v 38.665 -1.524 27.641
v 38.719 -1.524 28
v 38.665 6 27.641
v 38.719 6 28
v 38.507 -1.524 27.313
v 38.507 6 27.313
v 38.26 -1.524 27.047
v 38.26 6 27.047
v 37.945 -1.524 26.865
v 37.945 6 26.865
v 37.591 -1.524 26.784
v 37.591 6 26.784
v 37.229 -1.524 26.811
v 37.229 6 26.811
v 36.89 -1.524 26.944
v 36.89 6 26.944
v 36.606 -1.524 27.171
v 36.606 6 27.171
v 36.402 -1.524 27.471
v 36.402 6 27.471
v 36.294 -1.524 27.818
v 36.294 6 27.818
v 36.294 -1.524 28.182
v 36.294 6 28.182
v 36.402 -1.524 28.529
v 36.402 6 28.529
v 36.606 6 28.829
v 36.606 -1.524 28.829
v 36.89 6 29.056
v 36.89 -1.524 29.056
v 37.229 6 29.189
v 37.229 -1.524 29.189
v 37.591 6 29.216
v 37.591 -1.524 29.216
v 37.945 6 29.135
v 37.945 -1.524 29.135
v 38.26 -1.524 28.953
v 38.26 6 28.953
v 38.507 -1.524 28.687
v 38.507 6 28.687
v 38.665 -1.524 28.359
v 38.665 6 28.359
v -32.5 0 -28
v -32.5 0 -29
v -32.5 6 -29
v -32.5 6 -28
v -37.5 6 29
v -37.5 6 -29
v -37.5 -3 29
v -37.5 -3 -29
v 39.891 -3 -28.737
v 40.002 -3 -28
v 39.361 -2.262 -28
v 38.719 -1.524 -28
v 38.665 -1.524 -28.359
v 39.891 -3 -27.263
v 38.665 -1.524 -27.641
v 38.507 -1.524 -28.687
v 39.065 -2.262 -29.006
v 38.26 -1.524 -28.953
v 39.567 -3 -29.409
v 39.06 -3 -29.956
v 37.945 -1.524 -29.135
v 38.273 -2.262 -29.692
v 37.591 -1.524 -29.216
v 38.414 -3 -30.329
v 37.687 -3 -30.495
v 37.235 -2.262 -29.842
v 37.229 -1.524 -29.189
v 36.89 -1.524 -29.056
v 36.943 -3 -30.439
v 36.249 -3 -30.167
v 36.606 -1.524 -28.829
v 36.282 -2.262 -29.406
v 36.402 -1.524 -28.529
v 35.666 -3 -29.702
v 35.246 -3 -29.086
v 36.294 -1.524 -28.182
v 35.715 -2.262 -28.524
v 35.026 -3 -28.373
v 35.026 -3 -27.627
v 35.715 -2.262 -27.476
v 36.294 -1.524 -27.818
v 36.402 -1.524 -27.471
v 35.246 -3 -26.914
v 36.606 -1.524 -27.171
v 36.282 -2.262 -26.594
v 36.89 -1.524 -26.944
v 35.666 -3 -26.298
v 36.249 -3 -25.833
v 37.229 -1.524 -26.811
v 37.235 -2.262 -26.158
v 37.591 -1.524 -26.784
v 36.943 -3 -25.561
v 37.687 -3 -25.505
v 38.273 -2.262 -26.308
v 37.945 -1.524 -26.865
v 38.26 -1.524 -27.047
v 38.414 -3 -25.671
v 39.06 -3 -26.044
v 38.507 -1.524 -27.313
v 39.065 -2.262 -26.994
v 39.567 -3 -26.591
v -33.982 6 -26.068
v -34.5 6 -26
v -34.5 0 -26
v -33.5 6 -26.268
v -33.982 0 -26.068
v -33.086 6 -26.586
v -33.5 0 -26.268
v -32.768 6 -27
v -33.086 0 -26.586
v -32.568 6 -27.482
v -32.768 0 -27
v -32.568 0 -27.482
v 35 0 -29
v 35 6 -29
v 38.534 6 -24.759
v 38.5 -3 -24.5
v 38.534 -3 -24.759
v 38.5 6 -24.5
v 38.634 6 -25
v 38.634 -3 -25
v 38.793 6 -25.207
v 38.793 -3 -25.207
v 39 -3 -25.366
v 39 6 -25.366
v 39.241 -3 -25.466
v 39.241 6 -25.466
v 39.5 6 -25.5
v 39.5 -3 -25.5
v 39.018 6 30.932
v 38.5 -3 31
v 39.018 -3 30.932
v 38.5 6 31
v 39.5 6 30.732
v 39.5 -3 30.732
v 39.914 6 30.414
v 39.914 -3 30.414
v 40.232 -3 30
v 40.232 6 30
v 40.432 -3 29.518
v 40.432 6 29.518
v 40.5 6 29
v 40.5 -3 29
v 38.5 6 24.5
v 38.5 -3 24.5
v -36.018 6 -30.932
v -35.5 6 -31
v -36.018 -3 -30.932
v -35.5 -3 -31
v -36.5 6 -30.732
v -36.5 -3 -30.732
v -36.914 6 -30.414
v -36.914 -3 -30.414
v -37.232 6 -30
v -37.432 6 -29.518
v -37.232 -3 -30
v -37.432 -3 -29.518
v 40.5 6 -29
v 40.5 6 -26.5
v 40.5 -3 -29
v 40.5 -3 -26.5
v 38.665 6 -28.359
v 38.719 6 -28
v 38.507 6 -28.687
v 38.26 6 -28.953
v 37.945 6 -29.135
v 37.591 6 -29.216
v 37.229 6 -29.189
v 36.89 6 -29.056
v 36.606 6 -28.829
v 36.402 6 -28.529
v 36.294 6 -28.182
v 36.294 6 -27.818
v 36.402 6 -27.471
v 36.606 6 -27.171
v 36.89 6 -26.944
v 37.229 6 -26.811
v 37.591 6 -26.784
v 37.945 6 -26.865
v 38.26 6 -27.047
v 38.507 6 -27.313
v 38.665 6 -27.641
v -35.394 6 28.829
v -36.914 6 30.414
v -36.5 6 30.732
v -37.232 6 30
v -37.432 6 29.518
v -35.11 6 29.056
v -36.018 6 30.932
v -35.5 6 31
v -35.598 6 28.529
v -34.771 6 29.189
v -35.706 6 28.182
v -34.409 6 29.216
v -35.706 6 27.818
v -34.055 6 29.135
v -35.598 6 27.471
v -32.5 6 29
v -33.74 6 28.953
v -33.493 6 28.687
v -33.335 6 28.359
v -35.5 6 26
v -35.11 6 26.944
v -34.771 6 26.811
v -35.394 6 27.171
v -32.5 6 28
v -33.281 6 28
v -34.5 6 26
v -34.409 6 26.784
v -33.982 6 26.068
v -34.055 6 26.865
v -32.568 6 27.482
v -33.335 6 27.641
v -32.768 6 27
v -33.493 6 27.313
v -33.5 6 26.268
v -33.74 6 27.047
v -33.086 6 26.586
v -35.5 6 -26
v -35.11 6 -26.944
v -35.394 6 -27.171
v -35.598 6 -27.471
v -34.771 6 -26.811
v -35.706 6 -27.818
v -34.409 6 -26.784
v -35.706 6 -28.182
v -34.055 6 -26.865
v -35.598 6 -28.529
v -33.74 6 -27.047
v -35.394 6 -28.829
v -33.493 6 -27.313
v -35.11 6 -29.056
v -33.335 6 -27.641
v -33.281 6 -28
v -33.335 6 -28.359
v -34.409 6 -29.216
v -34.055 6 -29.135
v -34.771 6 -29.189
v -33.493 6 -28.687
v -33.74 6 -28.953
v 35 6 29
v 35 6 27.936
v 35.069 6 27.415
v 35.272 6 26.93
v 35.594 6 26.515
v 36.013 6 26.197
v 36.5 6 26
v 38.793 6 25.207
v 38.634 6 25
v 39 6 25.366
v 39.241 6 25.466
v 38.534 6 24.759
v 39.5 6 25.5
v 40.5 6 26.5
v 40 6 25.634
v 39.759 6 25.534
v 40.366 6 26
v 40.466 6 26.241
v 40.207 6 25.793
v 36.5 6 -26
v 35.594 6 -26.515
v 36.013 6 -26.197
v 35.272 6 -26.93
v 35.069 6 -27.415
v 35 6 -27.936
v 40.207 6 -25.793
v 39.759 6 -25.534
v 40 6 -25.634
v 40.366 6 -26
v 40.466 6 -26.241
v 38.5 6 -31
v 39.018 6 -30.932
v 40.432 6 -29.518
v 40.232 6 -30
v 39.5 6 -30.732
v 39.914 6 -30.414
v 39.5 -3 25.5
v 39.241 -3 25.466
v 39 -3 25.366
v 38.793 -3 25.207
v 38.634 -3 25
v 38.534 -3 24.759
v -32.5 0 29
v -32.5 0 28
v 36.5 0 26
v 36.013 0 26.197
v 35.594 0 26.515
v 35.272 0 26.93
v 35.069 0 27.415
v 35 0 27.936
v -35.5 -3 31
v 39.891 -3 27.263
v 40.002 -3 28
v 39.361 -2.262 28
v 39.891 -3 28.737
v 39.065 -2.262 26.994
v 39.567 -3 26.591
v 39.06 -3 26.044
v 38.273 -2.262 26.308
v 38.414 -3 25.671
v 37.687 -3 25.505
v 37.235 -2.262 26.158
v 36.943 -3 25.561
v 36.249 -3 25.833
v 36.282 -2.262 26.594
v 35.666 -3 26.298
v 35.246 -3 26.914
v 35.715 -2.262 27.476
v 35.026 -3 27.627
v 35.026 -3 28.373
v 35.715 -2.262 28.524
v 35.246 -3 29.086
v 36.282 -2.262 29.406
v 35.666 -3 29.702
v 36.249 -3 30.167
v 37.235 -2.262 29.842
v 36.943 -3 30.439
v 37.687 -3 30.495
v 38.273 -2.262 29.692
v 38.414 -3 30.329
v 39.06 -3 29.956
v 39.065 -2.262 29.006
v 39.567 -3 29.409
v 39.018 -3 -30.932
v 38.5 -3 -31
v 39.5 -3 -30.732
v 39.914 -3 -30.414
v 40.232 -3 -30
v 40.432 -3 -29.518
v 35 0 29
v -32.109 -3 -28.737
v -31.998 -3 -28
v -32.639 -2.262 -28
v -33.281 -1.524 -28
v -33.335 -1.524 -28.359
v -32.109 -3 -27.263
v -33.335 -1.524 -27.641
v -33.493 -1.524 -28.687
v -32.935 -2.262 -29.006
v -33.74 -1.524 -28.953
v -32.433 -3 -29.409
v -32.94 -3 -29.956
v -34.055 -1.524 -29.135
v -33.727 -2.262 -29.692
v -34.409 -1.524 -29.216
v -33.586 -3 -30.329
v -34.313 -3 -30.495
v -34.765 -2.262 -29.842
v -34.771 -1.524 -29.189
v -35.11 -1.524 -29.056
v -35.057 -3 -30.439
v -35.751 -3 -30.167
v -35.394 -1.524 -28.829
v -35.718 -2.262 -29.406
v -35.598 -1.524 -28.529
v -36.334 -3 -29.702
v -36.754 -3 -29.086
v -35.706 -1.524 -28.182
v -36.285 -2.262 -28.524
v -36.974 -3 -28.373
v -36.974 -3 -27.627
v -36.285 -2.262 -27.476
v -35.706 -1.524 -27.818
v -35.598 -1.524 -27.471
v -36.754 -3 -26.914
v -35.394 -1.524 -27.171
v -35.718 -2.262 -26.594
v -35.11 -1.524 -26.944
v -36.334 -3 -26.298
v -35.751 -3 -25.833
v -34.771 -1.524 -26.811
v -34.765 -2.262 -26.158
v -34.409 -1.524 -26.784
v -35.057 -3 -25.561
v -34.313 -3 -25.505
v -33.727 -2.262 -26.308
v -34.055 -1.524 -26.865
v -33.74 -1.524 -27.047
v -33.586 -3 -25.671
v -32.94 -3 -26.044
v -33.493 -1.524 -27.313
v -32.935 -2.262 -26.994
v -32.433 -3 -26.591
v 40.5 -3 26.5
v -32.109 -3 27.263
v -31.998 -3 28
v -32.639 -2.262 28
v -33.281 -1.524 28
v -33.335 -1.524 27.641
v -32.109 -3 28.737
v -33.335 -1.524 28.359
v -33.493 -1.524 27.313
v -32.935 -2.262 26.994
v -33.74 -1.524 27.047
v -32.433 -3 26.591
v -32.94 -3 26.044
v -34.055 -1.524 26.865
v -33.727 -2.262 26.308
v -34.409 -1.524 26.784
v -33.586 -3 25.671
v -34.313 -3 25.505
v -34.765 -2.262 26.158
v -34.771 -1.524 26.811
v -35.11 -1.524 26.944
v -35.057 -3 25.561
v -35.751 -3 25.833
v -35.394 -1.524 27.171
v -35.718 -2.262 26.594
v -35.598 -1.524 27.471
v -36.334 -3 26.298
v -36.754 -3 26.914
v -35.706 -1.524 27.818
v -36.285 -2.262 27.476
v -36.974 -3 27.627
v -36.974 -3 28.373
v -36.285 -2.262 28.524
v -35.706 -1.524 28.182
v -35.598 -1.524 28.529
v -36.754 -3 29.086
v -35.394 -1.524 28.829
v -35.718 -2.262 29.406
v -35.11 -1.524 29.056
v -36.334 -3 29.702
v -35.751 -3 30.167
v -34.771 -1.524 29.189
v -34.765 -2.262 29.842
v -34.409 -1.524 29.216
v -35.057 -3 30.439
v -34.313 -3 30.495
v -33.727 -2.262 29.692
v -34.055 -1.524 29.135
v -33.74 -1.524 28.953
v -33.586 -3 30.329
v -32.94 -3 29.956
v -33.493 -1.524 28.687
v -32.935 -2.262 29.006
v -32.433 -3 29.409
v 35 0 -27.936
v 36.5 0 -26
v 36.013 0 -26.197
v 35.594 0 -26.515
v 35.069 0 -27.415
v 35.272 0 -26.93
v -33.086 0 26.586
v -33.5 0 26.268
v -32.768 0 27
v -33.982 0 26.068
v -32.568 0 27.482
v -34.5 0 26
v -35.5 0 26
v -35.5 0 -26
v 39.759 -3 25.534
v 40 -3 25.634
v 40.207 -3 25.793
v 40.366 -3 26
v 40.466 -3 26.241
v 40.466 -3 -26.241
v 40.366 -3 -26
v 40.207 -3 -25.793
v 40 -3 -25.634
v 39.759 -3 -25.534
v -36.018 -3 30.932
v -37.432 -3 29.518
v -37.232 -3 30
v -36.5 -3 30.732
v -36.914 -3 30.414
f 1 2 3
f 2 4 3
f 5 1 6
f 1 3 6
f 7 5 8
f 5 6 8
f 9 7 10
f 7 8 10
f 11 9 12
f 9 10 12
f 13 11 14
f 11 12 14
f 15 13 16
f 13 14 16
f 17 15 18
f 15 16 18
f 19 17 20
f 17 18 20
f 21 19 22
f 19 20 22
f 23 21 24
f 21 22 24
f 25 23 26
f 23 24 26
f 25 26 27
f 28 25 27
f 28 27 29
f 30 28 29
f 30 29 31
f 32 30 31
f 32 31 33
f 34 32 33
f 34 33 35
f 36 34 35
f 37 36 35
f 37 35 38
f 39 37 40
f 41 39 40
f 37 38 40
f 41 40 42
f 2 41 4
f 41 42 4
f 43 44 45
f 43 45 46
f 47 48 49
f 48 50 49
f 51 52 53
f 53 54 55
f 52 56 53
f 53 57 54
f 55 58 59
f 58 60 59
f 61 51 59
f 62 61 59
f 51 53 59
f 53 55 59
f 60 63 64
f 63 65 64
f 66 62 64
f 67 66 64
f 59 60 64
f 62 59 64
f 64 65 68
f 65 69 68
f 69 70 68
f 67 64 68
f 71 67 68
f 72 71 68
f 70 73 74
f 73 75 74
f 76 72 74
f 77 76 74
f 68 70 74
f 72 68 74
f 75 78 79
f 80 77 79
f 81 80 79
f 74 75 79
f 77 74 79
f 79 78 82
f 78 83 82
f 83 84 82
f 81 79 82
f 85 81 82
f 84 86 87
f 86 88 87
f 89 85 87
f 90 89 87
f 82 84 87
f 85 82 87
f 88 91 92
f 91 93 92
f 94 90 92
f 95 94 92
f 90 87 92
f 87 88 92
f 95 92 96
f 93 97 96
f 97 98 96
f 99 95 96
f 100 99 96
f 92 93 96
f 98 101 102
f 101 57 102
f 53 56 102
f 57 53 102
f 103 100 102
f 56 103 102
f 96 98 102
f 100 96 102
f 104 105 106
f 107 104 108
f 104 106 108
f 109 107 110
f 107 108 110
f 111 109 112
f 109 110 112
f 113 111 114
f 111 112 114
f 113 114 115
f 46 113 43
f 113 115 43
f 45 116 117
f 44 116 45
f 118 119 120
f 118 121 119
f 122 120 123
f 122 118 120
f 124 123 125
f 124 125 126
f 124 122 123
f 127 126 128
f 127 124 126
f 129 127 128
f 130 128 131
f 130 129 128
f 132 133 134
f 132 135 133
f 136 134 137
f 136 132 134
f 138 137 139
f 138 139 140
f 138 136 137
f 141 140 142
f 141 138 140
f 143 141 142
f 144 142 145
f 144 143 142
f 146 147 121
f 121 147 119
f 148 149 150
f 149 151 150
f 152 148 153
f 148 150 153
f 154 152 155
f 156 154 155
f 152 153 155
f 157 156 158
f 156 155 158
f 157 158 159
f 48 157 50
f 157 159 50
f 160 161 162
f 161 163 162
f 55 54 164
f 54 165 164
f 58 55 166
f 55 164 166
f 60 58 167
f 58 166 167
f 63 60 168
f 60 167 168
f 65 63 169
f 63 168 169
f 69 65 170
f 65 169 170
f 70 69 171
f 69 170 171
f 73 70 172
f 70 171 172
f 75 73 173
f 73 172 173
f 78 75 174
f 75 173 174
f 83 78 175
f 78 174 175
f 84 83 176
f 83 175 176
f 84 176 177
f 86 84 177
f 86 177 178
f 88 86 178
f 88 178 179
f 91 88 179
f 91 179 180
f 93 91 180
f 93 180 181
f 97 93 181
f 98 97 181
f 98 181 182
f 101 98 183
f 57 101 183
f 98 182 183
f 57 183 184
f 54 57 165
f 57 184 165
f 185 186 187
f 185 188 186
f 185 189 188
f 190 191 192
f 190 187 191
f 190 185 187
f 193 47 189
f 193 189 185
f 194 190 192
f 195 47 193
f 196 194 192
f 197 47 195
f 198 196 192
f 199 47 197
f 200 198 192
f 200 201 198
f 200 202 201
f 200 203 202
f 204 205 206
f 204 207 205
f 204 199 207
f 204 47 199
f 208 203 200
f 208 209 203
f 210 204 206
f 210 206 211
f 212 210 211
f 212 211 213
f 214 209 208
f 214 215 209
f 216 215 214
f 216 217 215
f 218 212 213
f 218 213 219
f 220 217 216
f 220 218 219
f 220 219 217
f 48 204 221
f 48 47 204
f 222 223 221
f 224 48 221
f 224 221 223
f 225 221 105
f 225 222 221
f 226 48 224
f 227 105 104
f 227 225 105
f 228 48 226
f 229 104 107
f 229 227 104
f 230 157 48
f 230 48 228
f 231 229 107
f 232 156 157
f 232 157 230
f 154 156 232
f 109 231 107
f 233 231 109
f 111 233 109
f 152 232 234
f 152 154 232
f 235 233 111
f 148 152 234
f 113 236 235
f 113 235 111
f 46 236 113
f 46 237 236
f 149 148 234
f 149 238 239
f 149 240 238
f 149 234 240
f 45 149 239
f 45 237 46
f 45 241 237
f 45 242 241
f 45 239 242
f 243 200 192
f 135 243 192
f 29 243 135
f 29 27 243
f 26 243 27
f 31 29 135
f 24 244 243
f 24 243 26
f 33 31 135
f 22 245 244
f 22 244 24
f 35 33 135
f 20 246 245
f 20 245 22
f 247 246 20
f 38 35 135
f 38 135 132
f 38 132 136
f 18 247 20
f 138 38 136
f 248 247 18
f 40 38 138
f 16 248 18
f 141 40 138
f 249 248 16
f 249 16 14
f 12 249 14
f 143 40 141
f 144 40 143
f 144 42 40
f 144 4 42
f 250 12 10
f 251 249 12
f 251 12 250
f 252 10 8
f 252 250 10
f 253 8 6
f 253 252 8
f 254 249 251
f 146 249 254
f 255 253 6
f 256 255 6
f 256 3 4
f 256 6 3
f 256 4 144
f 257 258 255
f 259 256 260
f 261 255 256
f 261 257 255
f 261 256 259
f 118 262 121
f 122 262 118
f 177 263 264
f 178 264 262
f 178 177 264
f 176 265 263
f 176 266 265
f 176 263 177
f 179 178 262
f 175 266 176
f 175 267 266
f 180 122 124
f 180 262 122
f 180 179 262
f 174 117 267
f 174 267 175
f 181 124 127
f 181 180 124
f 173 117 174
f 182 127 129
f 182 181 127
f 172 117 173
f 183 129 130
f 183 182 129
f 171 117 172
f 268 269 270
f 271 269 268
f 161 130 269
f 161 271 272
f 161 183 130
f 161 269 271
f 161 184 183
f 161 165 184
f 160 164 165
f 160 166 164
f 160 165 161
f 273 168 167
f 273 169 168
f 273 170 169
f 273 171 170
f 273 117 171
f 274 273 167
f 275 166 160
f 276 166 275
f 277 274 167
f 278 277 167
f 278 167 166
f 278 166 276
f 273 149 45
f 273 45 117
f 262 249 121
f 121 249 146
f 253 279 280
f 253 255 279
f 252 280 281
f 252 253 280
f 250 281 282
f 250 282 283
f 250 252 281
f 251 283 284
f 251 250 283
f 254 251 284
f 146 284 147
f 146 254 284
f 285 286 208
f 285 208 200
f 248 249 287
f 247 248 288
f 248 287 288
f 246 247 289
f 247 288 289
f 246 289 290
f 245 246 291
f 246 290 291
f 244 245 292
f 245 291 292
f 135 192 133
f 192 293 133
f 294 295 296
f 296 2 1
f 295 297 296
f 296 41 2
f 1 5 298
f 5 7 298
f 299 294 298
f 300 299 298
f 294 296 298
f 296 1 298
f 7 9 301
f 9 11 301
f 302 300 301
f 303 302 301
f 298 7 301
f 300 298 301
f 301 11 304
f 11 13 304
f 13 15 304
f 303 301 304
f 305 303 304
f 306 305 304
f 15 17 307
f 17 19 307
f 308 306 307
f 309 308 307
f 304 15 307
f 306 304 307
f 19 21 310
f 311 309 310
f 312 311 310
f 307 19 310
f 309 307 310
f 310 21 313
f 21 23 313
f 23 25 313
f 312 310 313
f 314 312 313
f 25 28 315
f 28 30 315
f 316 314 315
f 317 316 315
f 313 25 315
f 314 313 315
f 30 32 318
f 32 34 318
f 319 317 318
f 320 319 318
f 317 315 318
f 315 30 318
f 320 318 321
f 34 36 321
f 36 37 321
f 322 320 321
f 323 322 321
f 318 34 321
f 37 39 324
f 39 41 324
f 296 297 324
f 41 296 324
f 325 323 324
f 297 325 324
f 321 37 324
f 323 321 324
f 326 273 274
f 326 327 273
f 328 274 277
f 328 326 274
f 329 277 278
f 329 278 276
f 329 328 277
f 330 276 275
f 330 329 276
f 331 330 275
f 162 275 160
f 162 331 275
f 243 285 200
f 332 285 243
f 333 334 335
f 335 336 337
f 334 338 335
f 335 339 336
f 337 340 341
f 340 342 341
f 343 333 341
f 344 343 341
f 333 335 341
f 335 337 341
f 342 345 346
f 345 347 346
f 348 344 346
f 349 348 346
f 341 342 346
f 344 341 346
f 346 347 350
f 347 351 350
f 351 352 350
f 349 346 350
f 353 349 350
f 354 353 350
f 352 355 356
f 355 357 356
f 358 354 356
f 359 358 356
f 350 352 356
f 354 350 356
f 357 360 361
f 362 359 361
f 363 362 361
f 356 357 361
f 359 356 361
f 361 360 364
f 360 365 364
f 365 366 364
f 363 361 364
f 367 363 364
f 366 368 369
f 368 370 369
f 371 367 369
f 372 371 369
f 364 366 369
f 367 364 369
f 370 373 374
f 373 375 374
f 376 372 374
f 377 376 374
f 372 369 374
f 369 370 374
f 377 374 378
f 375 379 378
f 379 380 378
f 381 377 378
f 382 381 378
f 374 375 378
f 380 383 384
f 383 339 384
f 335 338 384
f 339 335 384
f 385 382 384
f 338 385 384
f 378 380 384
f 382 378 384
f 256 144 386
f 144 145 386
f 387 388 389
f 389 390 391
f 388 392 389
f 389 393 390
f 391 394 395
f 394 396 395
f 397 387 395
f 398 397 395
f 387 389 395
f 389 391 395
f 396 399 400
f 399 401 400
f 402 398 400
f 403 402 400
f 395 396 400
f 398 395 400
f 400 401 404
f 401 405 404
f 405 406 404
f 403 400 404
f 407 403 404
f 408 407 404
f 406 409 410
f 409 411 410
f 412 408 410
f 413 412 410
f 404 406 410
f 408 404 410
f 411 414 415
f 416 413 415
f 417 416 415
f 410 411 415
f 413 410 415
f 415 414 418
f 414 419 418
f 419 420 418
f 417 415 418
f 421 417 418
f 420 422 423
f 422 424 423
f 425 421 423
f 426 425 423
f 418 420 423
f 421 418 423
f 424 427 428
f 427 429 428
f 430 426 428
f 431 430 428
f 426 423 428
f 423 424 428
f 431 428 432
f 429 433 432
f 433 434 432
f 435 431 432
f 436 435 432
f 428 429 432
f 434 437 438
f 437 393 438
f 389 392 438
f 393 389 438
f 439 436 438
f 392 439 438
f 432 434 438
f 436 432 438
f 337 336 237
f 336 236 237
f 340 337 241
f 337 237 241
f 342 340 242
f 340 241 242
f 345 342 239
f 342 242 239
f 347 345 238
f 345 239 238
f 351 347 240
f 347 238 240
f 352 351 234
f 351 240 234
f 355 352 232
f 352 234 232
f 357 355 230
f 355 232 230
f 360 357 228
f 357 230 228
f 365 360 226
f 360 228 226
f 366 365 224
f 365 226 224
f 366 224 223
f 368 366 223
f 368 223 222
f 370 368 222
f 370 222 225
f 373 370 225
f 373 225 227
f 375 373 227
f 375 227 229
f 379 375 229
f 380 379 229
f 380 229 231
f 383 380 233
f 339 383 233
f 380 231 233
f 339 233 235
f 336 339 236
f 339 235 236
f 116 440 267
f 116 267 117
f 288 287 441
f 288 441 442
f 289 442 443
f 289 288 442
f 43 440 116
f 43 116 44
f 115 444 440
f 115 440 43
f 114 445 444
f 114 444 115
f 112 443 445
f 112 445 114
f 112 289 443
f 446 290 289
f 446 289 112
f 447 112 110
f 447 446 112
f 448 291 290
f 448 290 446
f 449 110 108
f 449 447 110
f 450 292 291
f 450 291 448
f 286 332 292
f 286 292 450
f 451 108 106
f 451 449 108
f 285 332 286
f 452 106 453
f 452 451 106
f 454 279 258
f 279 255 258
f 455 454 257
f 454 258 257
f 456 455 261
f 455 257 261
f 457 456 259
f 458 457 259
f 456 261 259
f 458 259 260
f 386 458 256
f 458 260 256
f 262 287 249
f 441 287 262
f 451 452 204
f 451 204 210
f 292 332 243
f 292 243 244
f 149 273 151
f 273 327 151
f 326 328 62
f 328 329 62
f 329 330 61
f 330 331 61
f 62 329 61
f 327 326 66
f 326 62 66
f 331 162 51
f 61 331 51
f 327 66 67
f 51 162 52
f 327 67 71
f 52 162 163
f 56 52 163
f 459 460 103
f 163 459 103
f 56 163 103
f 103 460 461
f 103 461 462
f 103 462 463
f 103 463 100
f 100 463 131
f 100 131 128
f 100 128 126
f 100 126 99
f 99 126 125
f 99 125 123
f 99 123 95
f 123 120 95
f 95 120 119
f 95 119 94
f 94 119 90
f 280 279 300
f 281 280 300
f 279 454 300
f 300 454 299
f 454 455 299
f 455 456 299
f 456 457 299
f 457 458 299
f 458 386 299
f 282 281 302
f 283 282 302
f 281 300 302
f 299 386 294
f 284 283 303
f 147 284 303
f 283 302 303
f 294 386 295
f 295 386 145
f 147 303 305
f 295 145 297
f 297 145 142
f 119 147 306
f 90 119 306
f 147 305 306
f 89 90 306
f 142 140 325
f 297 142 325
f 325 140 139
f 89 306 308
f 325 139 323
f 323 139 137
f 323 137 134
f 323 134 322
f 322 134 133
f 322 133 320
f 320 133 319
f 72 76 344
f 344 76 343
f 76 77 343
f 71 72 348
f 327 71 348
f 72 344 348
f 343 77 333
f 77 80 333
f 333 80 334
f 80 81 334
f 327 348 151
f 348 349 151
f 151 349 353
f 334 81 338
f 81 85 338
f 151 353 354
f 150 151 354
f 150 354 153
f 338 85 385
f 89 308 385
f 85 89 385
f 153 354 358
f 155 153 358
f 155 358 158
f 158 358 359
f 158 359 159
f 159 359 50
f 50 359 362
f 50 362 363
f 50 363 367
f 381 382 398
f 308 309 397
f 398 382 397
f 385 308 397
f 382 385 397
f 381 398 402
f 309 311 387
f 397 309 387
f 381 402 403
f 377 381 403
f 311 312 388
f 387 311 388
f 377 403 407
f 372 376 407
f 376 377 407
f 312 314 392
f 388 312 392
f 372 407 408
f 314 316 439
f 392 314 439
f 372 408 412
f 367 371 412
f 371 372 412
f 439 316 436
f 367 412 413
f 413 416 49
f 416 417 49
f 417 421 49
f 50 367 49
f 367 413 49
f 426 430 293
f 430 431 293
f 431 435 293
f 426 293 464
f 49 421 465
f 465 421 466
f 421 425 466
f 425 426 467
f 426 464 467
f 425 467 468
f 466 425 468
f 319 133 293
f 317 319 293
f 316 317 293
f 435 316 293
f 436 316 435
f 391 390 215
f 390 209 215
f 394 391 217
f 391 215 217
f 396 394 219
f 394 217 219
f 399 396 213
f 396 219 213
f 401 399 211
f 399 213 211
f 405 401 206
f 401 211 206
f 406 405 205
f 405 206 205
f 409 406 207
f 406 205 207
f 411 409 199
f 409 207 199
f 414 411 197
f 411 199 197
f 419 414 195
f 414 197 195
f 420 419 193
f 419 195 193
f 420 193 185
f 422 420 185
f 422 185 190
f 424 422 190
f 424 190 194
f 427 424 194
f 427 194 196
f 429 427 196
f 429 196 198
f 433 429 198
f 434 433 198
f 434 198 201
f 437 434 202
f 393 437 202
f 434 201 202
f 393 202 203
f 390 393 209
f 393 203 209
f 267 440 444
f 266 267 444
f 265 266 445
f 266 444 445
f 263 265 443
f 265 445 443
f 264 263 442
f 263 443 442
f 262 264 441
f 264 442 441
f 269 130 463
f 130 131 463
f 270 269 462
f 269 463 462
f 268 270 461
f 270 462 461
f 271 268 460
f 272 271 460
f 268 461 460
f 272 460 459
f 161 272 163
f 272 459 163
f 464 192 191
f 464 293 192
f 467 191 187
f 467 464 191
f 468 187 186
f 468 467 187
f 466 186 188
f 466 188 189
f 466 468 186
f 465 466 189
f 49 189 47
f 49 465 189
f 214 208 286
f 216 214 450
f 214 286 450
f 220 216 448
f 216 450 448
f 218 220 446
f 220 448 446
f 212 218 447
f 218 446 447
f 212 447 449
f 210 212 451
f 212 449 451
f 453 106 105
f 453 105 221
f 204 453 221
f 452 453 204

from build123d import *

# Parameters (mm, degrees)
BOSS_EXTRUDE2_DEPTH                               = 3
BOSS_EXTRUDE3_DEPTH                               = 6
FILLET5_R                                         = 2
CSK_FOR_2_FLAT_HEAD_SOCKET_CAP_SCREW1_D           = 2.4384
CSK_FOR_2_FLAT_HEAD_SOCKET_CAP_SCREW1_CSINK_D     = 5.0038
CSK_FOR_2_FLAT_HEAD_SOCKET_CAP_SCREW1_CSINK_ANGLE = 82
FILLET6_R                                         = 2
FILLET7_R                                         = 1


# Some blends are built 0.0001 mm under size
with BuildPart() as part:
    # Sketch3 → Boss-Extrude2 (new body)
    with BuildSketch(Plane.XZ):
        Polygon((-37.5, 31), (40.5, 31), (40.5, 25.5), (38.5, 25.5), (38.5, -25.5), (40.5, -25.5), (40.5, -31), (-37.5, -31), align=None)
    extrude(amount=BOSS_EXTRUDE2_DEPTH)

    # Sketch4 → Boss-Extrude3 (add)
    with BuildSketch(Plane(origin=(0, 0, 0), x_dir=(1, 0, 0), z_dir=(0, 1, 0))):
        Polygon((-37.5, -31), (40.5, -31), (40.5, -25.5), (38.5, -25.5), (38.5, 25.5), (40.5, 25.5), (40.5, 31), (-37.5, 31), align=None)
        Polygon((-32.5, -29), (35, -29), (35, -26), (36.5, -26), (36.5, 26), (35, 26), (35, 29), (-32.5, 29), (-32.5, 26), (-35.5, 26), (-35.5, -26), (-32.5, -26), align=None, mode=Mode.SUBTRACT)
    extrude(amount=BOSS_EXTRUDE3_DEPTH)

    # Fillet5
    # the kernel refuses this fillet: 2 mm, written as the material it takes off along each edge
    with BuildSketch(Plane(origin=(35, 0, 26), x_dir=(0, 0, 1), z_dir=(0, 1, 0))) as fillet5_piece_1:
        with BuildLine():
            CenterArc((1.936491673, 2), FILLET5_R, 194.477512186, 75.522487814)
            Line((0, 1.5), (-0.038729833, 1.49))
            ThreePointArc((-0.038729833, 1.49), (-0.04, 0.75), (-0.04, 0))
            Line((-0.04, 0), (0, -0.04))
            Line((0, -0.04), (1.936491673, -0.04))
            Line((1.936491673, -0.04), (1.936491673, 0))
        make_face()
    extrude(amount=10.841229183, mode=Mode.SUBTRACT)
    with BuildSketch(Plane(origin=(35, 0, -26), x_dir=(1, 0, 0), z_dir=(0, 1, 0))) as fillet5_piece_2:
        with BuildLine():
            CenterArc((2, 1.936491673), FILLET5_R, 180, 75.522487814)
            Line((0, 1.936491673), (-0.04, 1.936491673))
            Line((-0.04, 1.936491673), (-0.04, 0))
            Line((-0.04, 0), (0, -0.04))
            ThreePointArc((0, -0.04), (0.75, -0.04), (1.49, -0.038729833))
            Line((1.49, -0.038729833), (1.5, 0))
        make_face()
    extrude(amount=10.841229183, mode=Mode.SUBTRACT)
    with BuildSketch(Plane(origin=(-32.5, 0, -26), x_dir=(0, 0, -1), z_dir=(0, 1, 0)), Plane(origin=(-32.5, 0, 26), x_dir=(-1, 0, 0), z_dir=(0, 1, 0))) as fillet5_piece_3:
        with BuildLine():
            CenterArc((FILLET5_R, FILLET5_R), FILLET5_R, 180, 90)
            Line((0, FILLET5_R), (-FILLET5_R * 0.02, FILLET5_R))
            Line((-FILLET5_R * 0.02, FILLET5_R), (-FILLET5_R * 0.02, -FILLET5_R * 0.02))
            Line((-FILLET5_R * 0.02, -FILLET5_R * 0.02), (FILLET5_R, -FILLET5_R * 0.02))
            Line((FILLET5_R, -FILLET5_R * 0.02), (FILLET5_R, 0))
        make_face()
    extrude(amount=11, mode=Mode.SUBTRACT)

    # CSK for #2 Flat Head Socket Cap Screw1 (through all)
    with Locations(Plane(origin=(0, -3, 0), x_dir=(-1, 0, 0), z_dir=(0, -1, 0))):
        with Locations((-37.5, 28), (34.5, 28), (34.5, -28), (-37.5, -28)):
            CounterSinkHole(CSK_FOR_2_FLAT_HEAD_SOCKET_CAP_SCREW1_D / 2, CSK_FOR_2_FLAT_HEAD_SOCKET_CAP_SCREW1_CSINK_D / 2, counter_sink_angle=CSK_FOR_2_FLAT_HEAD_SOCKET_CAP_SCREW1_CSINK_ANGLE)

    # Fillet6
    fillet6_edges = [part.edges().sort_by_distance(p)[0] for p in [
        (40.5, 1.5, -31),
        (-37.5, 1.5, -31),
        (-37.5, 1.5, 31),
        (40.5, 1.5, 31),
    ]]
    fillet(fillet6_edges, radius=FILLET6_R)

    # Fillet7
    fillet7_edges = [part.edges().sort_by_distance(p)[0] for p in [
        (38.5, 1.5, -25.5),
        (38.5, 1.5, 25.5),
    ]]
    fillet(fillet7_edges, radius=FILLET7_R)
    fillet7_2_edges = [part.edges().sort_by_distance(p)[0] for p in [
        (40.5, 1.5, -25.5),
        (40.5, 1.5, 25.5),
    ]]
    fillet(fillet7_2_edges, radius=FILLET7_R - 0.0001)  # a hair under: the kernel refuses the full size


solid = part.part
